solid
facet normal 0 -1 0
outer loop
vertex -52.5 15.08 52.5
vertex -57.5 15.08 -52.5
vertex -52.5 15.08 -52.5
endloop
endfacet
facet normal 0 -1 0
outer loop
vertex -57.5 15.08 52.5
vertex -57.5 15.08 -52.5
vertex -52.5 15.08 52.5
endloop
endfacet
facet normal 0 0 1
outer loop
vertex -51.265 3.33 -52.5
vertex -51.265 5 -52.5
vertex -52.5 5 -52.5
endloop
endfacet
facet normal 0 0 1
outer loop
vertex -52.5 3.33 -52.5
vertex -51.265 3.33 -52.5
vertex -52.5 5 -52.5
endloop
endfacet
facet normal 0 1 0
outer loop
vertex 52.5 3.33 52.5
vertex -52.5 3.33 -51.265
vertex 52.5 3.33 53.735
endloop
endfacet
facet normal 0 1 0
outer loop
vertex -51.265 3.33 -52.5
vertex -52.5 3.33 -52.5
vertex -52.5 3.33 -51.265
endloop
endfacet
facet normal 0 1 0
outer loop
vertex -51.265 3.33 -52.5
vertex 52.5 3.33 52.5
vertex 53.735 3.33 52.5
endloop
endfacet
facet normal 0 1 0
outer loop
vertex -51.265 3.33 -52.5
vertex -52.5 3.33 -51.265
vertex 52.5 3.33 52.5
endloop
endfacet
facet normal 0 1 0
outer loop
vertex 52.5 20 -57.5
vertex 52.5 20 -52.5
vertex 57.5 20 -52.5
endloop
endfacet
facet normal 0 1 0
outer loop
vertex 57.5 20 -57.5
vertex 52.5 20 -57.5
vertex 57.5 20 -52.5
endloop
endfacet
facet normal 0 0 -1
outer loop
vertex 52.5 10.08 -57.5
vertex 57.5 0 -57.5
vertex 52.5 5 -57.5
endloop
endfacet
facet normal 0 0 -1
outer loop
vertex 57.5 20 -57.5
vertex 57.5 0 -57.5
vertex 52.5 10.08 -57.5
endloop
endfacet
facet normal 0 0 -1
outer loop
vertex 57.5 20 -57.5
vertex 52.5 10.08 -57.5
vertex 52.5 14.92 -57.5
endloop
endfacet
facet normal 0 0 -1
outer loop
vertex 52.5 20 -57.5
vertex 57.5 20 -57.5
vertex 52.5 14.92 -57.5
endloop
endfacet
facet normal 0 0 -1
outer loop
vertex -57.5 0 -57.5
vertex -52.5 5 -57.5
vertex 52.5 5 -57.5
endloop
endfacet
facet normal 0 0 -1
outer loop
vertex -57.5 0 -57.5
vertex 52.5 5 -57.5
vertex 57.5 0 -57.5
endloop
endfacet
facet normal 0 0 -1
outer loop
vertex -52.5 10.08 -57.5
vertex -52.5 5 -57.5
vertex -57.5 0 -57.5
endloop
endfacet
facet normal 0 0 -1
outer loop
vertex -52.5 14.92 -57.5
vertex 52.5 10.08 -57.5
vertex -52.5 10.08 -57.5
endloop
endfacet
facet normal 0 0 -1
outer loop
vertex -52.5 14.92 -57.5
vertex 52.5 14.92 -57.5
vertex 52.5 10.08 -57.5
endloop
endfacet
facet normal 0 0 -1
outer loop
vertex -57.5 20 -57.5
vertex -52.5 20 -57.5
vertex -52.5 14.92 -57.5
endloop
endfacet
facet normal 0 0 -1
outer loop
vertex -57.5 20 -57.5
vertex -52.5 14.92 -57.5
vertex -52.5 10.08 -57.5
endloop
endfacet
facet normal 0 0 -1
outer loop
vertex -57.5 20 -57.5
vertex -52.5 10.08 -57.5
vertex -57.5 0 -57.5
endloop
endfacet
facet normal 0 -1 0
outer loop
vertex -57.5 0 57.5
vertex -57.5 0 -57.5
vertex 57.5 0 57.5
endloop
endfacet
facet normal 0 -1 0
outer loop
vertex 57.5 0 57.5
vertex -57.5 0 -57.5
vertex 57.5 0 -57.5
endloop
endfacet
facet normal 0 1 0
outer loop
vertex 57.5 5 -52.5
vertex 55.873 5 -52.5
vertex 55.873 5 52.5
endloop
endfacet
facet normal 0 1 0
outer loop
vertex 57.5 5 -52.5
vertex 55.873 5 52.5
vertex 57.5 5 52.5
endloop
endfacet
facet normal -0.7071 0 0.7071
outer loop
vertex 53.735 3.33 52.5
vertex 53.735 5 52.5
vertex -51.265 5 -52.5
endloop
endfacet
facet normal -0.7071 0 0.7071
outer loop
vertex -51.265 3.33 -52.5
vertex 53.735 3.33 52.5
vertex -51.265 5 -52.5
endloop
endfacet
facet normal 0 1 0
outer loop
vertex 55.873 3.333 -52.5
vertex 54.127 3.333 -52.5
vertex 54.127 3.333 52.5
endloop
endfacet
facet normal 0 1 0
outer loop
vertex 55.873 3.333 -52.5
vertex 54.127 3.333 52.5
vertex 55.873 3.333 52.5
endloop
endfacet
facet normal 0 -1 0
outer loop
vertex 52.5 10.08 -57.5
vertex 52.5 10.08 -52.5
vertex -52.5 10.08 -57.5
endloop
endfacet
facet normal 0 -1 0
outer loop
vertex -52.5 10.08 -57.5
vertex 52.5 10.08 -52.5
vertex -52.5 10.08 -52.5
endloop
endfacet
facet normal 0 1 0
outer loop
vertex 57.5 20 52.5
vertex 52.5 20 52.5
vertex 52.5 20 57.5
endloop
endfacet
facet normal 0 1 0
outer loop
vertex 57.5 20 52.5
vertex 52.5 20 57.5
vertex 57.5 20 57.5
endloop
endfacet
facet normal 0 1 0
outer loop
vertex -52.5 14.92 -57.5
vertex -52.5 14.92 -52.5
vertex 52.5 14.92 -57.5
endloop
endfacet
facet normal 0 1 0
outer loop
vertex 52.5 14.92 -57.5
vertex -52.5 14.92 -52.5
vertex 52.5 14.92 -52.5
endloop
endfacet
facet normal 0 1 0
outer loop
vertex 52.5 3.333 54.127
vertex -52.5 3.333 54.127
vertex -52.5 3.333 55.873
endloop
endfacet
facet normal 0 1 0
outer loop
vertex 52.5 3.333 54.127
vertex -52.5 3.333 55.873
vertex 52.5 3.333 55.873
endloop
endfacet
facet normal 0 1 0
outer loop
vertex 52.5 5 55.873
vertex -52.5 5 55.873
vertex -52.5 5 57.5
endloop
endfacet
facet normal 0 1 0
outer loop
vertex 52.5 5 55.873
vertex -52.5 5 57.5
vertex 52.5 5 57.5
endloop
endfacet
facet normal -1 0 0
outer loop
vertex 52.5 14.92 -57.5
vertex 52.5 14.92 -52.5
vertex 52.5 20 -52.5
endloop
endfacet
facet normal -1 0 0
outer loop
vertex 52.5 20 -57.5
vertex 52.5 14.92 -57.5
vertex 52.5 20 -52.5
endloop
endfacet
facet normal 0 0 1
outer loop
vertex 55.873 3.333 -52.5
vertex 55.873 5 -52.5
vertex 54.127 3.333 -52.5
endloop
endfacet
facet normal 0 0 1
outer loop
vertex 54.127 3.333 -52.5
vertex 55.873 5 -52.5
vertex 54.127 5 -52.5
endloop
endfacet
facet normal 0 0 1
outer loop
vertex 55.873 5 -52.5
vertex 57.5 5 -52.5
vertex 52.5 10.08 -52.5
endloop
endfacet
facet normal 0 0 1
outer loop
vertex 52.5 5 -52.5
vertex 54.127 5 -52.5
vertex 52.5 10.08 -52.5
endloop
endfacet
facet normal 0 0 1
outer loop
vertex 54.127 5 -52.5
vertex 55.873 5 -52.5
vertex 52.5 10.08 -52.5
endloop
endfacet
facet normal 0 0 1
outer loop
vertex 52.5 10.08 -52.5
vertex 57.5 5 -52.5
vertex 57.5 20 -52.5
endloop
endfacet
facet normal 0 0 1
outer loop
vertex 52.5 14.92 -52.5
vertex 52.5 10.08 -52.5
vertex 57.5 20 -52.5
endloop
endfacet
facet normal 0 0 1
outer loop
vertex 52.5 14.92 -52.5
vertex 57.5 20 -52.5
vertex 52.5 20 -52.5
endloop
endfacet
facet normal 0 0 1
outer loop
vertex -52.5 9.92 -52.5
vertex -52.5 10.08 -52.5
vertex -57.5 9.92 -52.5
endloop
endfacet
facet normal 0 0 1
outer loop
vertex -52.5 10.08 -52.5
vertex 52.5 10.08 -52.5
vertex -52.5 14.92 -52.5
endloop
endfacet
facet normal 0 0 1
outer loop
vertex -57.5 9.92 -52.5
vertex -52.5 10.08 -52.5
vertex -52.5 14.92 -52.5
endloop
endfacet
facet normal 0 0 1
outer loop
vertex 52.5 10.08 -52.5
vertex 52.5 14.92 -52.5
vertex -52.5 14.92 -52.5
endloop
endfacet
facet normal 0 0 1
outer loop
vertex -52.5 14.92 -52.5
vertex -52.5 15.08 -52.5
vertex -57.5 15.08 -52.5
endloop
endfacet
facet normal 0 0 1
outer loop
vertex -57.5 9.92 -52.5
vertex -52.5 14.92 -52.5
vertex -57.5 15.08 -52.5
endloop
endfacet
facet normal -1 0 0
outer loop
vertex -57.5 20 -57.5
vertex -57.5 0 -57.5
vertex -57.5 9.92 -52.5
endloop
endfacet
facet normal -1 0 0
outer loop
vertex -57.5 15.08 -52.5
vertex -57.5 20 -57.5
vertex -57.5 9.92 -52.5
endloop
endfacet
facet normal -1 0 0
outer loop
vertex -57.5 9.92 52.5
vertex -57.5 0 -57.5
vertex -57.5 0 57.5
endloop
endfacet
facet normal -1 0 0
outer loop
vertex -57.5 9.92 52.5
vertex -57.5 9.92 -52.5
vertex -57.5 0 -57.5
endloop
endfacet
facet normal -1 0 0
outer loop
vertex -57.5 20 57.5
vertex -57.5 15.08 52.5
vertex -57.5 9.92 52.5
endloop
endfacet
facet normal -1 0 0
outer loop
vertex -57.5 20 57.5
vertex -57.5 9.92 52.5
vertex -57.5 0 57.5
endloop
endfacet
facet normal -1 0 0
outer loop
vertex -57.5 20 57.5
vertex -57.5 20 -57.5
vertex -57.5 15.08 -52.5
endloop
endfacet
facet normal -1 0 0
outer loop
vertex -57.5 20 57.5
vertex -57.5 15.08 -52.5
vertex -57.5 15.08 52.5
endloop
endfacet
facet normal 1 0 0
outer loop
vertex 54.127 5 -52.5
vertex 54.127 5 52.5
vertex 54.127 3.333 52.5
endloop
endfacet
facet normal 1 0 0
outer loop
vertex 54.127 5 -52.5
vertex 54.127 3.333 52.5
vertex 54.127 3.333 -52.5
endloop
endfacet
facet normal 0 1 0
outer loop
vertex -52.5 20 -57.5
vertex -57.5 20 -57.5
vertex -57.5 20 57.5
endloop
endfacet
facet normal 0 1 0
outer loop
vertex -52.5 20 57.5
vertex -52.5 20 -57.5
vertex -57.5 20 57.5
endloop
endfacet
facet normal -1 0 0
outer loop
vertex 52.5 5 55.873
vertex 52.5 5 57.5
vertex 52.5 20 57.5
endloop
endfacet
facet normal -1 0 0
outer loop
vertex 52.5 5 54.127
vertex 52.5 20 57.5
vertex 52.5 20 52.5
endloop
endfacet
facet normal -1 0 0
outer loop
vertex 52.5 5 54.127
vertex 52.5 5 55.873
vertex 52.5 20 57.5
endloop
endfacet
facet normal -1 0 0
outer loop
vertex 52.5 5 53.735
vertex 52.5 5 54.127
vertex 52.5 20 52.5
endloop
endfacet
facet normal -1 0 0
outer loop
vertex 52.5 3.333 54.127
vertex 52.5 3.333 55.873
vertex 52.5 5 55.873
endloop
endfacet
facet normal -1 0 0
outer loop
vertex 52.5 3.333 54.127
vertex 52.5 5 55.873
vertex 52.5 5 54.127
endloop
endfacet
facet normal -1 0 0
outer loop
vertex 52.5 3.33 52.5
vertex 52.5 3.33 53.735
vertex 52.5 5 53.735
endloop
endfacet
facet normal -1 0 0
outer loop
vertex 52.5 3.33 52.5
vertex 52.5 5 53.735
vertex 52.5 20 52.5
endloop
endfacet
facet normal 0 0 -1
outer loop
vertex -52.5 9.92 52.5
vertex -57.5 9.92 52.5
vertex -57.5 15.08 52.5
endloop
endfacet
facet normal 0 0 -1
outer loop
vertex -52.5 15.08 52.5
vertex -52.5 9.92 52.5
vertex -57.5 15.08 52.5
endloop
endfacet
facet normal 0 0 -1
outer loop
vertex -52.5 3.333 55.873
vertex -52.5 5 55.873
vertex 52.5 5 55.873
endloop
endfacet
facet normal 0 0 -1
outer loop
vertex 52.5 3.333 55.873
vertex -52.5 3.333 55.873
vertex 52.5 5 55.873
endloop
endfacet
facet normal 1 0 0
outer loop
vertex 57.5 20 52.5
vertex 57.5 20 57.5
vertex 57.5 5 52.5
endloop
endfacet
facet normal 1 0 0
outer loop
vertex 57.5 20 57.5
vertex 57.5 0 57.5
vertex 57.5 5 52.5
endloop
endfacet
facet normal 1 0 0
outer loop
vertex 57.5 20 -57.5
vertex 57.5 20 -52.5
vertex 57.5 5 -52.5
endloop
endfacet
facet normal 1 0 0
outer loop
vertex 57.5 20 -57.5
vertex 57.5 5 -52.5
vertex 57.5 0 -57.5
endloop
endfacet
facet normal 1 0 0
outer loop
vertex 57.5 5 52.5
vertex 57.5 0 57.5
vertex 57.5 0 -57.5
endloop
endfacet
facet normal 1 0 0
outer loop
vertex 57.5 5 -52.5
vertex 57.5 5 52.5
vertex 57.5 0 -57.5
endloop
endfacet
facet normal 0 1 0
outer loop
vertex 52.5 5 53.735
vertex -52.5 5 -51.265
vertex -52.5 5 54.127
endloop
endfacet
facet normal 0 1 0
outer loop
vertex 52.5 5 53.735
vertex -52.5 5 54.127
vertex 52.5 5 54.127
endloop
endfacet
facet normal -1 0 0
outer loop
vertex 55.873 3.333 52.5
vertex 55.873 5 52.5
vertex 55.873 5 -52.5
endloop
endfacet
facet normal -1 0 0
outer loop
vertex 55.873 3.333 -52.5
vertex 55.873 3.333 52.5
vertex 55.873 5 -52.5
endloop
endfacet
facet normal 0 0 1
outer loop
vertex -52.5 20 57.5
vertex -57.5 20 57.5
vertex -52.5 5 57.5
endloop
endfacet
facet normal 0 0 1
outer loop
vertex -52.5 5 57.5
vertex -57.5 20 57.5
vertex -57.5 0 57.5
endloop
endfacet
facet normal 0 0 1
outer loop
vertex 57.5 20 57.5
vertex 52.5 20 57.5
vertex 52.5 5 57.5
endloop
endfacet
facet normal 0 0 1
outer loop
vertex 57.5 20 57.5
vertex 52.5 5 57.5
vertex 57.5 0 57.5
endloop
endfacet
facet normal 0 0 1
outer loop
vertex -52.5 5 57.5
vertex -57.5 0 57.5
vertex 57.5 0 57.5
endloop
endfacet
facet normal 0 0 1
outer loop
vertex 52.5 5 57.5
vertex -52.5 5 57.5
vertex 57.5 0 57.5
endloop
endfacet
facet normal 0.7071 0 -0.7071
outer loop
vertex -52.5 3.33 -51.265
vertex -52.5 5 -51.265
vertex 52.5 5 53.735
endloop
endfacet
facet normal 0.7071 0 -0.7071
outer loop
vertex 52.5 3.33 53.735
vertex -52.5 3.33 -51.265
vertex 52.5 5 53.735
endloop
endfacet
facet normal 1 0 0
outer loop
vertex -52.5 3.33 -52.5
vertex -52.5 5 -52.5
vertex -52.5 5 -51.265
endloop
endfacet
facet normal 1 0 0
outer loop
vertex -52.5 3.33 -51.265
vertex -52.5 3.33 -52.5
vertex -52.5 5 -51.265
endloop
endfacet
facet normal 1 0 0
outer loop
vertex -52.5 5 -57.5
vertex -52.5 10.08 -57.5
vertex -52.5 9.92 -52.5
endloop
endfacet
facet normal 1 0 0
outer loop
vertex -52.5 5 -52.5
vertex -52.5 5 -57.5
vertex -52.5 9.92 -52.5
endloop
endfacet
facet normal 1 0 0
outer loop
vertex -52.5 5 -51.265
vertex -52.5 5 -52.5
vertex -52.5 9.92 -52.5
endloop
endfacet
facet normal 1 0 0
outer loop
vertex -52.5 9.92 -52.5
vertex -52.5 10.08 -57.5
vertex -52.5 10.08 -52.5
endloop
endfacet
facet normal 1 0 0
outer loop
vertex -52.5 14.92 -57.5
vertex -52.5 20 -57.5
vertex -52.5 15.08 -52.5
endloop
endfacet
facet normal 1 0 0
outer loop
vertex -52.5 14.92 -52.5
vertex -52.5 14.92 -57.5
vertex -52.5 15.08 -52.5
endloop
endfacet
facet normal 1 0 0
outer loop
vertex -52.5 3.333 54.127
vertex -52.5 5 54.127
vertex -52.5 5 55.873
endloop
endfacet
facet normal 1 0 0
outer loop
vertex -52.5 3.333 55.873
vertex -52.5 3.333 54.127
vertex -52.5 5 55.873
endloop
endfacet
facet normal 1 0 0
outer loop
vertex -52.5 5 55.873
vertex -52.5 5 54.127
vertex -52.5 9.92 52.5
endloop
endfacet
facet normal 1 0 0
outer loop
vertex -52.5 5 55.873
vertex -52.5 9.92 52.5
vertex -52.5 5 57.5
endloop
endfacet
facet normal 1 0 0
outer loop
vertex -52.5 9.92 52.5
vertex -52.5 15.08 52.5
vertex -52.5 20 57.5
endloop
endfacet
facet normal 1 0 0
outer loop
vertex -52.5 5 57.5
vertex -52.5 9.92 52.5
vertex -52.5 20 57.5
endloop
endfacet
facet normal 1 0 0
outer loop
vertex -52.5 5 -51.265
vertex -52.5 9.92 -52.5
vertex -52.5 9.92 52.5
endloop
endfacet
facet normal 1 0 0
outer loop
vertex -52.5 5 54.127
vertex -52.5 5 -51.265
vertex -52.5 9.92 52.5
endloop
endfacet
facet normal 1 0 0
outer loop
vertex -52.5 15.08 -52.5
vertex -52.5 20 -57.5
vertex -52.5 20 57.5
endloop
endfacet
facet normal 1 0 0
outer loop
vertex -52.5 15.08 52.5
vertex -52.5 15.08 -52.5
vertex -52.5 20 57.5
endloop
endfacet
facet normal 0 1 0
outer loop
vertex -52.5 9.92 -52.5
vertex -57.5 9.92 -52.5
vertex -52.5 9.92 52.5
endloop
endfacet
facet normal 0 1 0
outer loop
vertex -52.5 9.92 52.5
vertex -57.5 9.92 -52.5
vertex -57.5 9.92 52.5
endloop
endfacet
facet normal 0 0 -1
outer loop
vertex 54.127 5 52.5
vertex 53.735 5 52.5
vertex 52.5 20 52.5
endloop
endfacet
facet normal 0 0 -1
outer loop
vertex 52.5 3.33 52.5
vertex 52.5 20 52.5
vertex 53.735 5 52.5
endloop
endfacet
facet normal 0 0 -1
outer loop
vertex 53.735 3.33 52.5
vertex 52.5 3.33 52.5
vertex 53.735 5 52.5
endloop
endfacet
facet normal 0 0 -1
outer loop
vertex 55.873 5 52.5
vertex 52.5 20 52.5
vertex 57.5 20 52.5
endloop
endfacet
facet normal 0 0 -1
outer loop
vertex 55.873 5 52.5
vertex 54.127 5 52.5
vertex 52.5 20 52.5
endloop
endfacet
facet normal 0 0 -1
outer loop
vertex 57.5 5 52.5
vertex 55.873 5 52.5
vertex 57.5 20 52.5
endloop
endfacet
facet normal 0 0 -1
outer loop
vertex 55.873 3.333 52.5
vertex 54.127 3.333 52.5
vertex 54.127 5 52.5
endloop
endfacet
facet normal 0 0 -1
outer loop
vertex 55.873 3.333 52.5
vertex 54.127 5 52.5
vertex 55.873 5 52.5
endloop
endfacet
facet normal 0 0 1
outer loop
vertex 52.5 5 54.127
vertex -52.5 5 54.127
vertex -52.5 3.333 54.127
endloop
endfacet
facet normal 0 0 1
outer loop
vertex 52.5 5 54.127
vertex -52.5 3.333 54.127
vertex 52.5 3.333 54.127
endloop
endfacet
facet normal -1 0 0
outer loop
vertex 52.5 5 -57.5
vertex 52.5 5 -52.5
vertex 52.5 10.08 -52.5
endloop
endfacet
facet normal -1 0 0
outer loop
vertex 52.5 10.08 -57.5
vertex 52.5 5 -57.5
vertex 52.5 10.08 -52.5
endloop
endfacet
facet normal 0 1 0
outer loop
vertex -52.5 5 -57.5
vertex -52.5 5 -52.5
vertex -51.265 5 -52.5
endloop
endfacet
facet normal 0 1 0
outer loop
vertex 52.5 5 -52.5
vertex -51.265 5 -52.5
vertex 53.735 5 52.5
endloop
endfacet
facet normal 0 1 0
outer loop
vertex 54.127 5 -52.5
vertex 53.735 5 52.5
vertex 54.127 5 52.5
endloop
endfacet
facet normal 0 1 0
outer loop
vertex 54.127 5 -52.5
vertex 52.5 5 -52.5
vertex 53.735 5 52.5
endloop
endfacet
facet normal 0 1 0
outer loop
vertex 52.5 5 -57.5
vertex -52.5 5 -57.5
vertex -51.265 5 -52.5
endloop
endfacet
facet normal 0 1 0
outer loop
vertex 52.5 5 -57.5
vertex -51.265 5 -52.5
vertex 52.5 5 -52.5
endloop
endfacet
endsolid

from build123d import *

# Parameters (mm, degrees)
SKETCH1_W          = 115
SKETCH1_H          = 115
BASE_DEPTH         = 5
SKETCH2_W          = 115
SKETCH2_H          = 15
SKETCH2_W_2        = 105
SKETCH2_H_2        = 5.16
FRAME1_DEPTH       = 5
FRAME2_START       = -5
FRAME2_DEPTH       = 5
SKETCH5_W          = 5
SKETCH5_H          = 5
POST_DEPTH         = 15
SKETCH6_W          = 1.746666666
SKETCH6_H          = 105
SKETCH6_W_2        = 105
SKETCH6_H_2        = 1.746666666
TRACKS_DEPTH       = 1.666666667
CUT_EXTRUDE1_DEPTH = 1.67


with BuildPart() as part:
    # Sketch1 → Base (new body)
    with BuildSketch(Plane(origin=(0, 0, 0), x_dir=(1, 0, 0), z_dir=(0, 1, 0))):
        Rectangle(SKETCH1_W, SKETCH1_H)
    extrude(amount=BASE_DEPTH)

    # Sketch2 → Frame1 (add)
    with BuildSketch(Plane.ZY.offset(57.5)):
        with Locations((0, 12.5)):
            Rectangle(SKETCH2_W, SKETCH2_H)
        with Locations((0, 12.5)):
            Rectangle(SKETCH2_W_2, SKETCH2_H_2, mode=Mode.SUBTRACT)
    extrude(amount=-FRAME1_DEPTH)

    # Sketch4 → Frame2 (add)
    with BuildSketch(Plane(origin=(0, 0, -57.5), x_dir=(-1, 0, 0), z_dir=(0, 0, -1)).offset(FRAME2_START)):
        Polygon((-57.5, 5), (-52.5, 5), (-52.5, 10.08), (52.5, 10.08), (52.5, 5), (57.5, 5), (57.5, 20), (52.5, 20), (52.5, 14.92), (-52.5, 14.92), (-52.5, 20), (-57.5, 20), align=None)
    extrude(amount=FRAME2_DEPTH)

    # Sketch5 → Post (add)
    with BuildSketch(Plane(origin=(0, 5, 0), x_dir=(1, 0, 0), z_dir=(0, 1, 0))):
        with Locations((55, -55)):
            Rectangle(SKETCH5_W, SKETCH5_H)
    extrude(amount=POST_DEPTH)

    # Sketch6 → Tracks (cut)
    with BuildSketch(Plane(origin=(0, 5, 0), x_dir=(1, 0, 0), z_dir=(0, 1, 0))):
        with Locations((55, 0)):
            Rectangle(SKETCH6_W, SKETCH6_H)
        with Locations((0, -55)):
            Rectangle(SKETCH6_W_2, SKETCH6_H_2)
    extrude(amount=-TRACKS_DEPTH, mode=Mode.SUBTRACT)

    # Sketch7 → Cut-Extrude1 (cut)
    with BuildSketch(Plane(origin=(0, 5, 0), x_dir=(1, 0, 0), z_dir=(0, 1, 0))):
        Polygon((53.735079844, -52.5), (-51.264920156, 52.5), (-52.5, 52.5), (-52.5, 51.264920156), (52.5, -53.735079844), (52.5, -52.5), align=None)
    extrude(amount=-CUT_EXTRUDE1_DEPTH, mode=Mode.SUBTRACT)


solid = part.part
